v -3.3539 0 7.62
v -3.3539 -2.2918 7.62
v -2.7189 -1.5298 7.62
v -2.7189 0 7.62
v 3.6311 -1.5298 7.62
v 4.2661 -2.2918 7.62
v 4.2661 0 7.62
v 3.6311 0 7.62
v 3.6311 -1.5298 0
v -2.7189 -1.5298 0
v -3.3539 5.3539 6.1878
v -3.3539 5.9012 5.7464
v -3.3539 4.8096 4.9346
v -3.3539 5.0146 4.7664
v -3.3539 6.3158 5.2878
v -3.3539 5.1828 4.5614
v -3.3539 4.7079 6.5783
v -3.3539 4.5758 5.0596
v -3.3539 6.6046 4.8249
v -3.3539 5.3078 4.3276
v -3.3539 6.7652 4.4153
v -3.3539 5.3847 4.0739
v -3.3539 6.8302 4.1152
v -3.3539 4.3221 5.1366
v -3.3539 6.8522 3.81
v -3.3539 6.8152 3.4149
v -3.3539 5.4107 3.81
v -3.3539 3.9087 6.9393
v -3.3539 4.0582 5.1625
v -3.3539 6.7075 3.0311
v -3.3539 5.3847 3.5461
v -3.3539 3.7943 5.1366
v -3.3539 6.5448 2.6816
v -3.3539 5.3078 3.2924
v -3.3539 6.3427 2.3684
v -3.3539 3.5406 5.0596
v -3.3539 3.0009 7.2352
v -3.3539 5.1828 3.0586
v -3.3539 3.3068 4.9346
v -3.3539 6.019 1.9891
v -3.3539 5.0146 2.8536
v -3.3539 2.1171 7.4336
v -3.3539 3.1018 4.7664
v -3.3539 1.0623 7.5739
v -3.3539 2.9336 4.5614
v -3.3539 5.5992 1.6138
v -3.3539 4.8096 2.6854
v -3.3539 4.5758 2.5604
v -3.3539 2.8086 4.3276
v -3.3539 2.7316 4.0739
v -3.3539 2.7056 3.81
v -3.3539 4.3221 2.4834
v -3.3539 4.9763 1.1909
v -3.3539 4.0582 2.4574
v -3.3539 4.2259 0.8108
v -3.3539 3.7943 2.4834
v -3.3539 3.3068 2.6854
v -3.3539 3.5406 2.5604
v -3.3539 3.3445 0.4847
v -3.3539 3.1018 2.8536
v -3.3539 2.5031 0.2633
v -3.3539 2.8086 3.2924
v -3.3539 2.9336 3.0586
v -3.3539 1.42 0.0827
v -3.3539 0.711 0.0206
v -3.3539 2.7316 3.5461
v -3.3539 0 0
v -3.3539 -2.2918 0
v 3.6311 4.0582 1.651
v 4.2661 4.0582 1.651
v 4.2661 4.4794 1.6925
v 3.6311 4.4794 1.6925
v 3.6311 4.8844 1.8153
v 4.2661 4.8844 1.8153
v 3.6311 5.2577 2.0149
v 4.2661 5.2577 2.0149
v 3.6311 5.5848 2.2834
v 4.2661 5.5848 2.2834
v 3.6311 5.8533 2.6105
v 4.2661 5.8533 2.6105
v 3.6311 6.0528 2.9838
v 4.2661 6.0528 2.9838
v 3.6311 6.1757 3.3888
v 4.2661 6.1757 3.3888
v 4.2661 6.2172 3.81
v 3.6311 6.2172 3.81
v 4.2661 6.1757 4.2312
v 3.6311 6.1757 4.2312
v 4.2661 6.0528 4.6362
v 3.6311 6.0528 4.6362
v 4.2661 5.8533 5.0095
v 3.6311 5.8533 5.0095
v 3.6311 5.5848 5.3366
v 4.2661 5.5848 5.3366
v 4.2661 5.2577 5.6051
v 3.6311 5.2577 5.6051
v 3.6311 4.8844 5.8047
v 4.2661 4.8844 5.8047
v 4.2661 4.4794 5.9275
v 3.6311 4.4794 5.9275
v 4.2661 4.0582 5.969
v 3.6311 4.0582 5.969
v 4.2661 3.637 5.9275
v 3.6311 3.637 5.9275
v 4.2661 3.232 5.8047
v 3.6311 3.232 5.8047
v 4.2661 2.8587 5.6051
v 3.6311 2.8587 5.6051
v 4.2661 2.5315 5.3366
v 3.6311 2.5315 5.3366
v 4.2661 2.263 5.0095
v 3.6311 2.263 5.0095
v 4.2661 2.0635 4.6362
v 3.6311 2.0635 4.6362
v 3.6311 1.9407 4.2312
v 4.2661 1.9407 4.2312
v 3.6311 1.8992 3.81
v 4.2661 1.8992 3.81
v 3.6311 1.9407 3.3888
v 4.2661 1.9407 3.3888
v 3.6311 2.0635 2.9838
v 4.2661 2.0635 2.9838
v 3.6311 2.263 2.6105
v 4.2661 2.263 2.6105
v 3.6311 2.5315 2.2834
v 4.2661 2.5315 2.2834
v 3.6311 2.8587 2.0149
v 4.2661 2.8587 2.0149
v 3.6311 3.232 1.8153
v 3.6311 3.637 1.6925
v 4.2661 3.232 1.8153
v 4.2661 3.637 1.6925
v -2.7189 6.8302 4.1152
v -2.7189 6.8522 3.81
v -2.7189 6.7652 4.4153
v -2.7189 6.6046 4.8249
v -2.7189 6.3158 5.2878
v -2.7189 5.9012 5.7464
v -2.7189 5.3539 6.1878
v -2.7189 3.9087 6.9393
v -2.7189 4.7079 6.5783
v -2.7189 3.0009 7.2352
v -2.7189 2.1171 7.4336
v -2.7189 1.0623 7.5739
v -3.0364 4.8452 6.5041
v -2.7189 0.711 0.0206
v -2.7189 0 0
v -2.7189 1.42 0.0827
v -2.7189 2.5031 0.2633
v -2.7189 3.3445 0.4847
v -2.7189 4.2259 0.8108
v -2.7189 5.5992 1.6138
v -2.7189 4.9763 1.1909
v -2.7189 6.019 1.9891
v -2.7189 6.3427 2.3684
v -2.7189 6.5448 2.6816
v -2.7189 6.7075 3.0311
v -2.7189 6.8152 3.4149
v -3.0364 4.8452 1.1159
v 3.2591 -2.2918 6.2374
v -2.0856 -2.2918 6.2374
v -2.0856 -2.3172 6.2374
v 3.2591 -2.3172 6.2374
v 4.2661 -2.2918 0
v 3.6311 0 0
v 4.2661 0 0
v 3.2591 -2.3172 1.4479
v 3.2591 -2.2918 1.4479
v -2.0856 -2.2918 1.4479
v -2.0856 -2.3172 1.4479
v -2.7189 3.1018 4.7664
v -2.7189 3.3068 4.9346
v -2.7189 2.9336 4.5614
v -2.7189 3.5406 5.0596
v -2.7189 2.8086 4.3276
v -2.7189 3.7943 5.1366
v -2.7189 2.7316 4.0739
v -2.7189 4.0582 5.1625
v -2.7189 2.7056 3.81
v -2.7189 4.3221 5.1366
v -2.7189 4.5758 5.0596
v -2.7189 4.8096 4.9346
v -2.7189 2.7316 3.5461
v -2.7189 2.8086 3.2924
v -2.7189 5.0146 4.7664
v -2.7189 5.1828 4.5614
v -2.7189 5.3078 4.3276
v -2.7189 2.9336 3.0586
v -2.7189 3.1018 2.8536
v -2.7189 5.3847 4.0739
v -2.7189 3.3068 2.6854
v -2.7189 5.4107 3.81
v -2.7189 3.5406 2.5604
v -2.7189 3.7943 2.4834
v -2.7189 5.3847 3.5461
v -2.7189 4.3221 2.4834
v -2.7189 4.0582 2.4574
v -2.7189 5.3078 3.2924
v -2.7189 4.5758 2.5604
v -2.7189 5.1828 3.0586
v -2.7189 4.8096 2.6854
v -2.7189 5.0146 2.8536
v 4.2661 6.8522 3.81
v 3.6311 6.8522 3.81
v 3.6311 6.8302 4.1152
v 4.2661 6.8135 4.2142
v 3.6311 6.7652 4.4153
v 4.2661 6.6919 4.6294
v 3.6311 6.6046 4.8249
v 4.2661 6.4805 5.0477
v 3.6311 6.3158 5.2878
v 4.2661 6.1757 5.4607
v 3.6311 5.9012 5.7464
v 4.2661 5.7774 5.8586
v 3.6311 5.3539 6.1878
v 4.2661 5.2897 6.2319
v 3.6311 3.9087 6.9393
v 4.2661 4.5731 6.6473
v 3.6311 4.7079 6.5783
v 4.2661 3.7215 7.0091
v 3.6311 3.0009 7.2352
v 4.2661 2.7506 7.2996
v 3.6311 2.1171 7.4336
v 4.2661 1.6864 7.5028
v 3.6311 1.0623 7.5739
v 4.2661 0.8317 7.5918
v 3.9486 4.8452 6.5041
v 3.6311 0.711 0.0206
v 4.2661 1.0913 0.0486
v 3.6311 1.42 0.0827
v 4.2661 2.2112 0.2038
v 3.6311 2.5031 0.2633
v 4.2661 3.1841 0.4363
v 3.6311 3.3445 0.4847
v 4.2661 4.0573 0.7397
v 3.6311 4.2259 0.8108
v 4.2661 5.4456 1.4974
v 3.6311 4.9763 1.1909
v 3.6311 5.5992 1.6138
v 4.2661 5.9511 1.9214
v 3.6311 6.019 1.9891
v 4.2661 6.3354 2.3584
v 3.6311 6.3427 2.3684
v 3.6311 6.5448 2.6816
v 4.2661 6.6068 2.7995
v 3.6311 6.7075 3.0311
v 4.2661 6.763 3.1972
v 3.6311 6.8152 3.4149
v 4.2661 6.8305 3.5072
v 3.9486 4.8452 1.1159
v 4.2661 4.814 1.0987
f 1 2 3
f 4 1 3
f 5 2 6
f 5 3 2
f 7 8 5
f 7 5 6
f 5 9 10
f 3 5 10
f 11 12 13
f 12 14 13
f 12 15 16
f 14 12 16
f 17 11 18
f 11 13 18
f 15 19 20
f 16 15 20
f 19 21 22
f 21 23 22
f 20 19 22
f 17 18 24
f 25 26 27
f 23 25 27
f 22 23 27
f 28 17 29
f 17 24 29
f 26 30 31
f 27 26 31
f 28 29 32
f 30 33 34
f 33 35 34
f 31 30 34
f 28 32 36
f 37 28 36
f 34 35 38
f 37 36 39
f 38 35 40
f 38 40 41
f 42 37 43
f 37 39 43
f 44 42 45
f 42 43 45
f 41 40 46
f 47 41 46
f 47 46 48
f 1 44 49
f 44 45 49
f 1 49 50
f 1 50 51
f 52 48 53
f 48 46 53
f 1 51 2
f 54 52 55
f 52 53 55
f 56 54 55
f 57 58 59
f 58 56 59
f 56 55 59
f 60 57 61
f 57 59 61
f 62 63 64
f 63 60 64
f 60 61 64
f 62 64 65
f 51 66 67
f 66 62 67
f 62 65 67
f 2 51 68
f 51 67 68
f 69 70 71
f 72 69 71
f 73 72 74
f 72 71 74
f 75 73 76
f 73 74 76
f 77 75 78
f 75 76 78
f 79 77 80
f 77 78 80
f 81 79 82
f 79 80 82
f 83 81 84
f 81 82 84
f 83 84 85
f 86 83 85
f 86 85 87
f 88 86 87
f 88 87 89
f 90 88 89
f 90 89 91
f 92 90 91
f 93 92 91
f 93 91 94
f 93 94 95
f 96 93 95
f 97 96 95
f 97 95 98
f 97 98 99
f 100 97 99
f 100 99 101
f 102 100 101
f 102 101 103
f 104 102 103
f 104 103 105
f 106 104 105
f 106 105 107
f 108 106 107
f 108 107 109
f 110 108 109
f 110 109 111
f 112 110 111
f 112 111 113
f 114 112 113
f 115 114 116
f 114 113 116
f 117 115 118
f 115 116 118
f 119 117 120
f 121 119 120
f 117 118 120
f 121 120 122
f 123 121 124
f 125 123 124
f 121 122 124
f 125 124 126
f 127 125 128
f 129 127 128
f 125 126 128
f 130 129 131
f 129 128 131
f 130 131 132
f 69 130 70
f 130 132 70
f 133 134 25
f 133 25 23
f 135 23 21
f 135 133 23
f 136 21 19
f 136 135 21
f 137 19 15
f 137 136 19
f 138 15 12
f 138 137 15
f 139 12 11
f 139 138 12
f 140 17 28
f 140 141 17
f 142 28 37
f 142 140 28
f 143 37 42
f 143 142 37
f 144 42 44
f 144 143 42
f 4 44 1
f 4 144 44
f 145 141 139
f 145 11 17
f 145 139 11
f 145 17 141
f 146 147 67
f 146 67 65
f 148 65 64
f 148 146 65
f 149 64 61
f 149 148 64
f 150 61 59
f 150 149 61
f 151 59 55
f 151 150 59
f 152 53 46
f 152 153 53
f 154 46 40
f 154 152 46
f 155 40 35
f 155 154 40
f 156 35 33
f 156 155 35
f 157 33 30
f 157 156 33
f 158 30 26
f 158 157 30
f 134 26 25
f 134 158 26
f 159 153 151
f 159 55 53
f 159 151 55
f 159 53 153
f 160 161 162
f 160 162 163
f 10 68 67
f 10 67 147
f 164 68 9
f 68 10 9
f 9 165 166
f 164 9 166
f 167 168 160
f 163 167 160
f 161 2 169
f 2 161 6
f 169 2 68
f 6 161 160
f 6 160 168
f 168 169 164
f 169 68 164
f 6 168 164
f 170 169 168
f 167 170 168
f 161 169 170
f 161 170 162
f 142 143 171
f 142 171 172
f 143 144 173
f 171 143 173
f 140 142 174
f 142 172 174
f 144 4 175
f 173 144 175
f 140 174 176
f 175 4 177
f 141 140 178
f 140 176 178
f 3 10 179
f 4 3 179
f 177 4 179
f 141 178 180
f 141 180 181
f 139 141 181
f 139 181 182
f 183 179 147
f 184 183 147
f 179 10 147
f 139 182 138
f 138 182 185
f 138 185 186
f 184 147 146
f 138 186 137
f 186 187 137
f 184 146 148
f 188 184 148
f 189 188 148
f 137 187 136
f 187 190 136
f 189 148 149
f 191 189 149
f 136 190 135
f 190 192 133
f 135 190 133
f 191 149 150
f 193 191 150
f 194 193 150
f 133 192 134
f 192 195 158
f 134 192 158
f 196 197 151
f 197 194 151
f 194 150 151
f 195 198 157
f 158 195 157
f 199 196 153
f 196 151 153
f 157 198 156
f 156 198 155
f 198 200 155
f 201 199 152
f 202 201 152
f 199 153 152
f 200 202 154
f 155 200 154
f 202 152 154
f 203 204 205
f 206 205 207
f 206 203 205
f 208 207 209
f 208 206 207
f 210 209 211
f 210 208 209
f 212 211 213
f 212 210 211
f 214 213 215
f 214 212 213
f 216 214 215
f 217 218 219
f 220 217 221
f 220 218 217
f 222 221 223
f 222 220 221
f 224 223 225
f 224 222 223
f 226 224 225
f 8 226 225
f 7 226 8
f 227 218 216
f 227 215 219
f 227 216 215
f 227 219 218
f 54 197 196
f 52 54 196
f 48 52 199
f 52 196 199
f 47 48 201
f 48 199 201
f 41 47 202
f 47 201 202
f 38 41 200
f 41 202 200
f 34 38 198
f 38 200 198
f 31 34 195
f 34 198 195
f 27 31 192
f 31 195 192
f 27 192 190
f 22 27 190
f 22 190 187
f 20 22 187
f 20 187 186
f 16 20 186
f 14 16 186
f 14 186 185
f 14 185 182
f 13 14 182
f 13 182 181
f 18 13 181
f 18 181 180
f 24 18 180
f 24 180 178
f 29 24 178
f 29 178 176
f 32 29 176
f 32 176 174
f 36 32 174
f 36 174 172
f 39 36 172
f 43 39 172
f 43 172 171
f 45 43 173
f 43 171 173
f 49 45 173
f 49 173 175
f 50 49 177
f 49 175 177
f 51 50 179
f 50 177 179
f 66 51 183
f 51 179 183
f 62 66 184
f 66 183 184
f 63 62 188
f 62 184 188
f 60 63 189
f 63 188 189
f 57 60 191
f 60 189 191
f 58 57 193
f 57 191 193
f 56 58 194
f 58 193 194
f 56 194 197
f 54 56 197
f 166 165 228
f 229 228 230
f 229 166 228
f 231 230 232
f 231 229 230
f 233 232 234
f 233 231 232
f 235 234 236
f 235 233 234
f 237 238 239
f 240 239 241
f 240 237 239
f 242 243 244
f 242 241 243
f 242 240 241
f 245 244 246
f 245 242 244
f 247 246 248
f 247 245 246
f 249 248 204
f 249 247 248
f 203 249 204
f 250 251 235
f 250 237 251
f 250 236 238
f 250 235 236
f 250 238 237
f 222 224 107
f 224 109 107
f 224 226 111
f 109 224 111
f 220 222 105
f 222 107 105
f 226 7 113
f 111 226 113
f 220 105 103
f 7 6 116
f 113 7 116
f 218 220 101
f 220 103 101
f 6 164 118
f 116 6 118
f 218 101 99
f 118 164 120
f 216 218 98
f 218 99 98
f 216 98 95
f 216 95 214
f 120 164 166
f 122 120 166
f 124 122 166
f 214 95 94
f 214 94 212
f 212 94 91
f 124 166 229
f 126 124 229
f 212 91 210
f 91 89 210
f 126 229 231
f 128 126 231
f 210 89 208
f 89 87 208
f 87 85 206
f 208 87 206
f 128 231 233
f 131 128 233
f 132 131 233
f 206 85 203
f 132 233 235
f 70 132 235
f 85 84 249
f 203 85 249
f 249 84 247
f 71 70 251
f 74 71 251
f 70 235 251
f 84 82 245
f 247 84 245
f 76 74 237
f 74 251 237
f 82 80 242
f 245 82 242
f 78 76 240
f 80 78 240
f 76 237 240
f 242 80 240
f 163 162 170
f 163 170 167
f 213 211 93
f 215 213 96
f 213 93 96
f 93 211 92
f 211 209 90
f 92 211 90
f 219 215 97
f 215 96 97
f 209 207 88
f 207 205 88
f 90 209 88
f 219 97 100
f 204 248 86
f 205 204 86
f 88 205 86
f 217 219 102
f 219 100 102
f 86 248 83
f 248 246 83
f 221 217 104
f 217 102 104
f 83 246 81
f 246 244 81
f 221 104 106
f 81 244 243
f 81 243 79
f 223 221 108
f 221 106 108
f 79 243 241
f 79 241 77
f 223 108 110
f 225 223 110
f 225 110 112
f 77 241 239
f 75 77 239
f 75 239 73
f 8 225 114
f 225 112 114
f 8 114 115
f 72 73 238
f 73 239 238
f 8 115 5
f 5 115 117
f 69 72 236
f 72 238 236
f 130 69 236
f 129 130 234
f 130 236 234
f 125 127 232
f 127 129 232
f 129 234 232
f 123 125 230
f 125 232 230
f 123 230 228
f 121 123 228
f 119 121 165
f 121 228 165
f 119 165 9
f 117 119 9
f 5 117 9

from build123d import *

# Parameters (mm, degrees)
BOSS_EXTRUDE1_DEPTH       = 7.62
F_6_32_TAPPED_HOLE1_D     = 2.7051
F_6_32_TAPPED_HOLE1_DEPTH = 0.635
CUT_EXTRUDE1_REACH        = 9.62
SKETCH6_R                 = 2.159
CUT_EXTRUDE6_DEPTH        = 8.62
SKETCH27_W                = 5.344661664
SKETCH27_H                = 4.789513508
BOSS_EXTRUDE2_DEPTH       = 0.0254


with BuildPart() as part:
    # Sketch1 → Boss-Extrude1 (new body)
    with BuildSketch(Plane.XY):
        Polygon((-3.353873239, 6.85218662), (-3.353873239, -2.29181338), (4.266126761, -2.29181338), (4.266126761, 6.85218662), (3.631126761, 6.85218662), (3.631126761, -1.52981338), (-2.718873239, -1.52981338), (-2.718873239, 6.85218662), align=None)
    extrude(amount=BOSS_EXTRUDE1_DEPTH)

    # #6-32 Tapped Hole1
    with Locations(Plane.ZY.offset(3.353873239)):
        with Locations((3.81, 4.05818662)):
            Hole(F_6_32_TAPPED_HOLE1_D / 2, depth=F_6_32_TAPPED_HOLE1_DEPTH)

    # Sketch6 → Cut-Extrude1 (cut, up to next)
    with BuildSketch(Plane(origin=(4.266126761, 0, 0), x_dir=(0, 0, -1), z_dir=(1, 0, 0)), mode=Mode.PRIVATE) as cut_extrude1_sk1:
        with Locations((-3.81, 4.05818662)):
            Circle(SKETCH6_R)
    cut_extrude1_tool1 = extrude(cut_extrude1_sk1.sketch, amount=-CUT_EXTRUDE1_REACH, mode=Mode.PRIVATE) & part.part
    add(cut_extrude1_tool1.solids().sort_by_distance((4.266127, 4.058187, 3.81))[0], mode=Mode.SUBTRACT)

    # Sketch26 → Cut-Extrude6 (cut, through all)
    with BuildSketch(Plane(origin=(4.266126761, 0, 0), x_dir=(0, 0, -1), z_dir=(1, 0, 0))):
        with BuildLine():
            add(Edge.make_bspline(
                [(0, 0), (0, 6.85218662), (-3.81, 6.85218662)],
                knots=[4.71238898, 4.71238898, 4.71238898, 6.283185307, 6.283185307, 6.283185307], degree=2, weights=[1, 0.707106781, 1]))
            Line((0, 0), (0, 6.85218662))
            Line((0, 6.85218662), (-3.81, 6.85218662))
        make_face()
        with BuildLine():
            add(Edge.make_bspline(
                [(-3.81, 6.85218662), (-7.62, 6.85218662), (-7.62, 0)],
                knots=[6.283185307, 6.283185307, 6.283185307, 7.853981634, 7.853981634, 7.853981634], degree=2, weights=[1, 0.707106781, 1]))
            Line((-3.81, 6.85218662), (-7.62, 6.85218662))
            Line((-7.62, 6.85218662), (-7.62, 0))
        make_face()
    extrude(amount=-CUT_EXTRUDE6_DEPTH, mode=Mode.SUBTRACT)

    # Sketch27 → Boss-Extrude2 (add)
    with BuildSketch(Plane.XZ.offset(2.29181338)):
        with Locations((0.586749856, 3.842655774)):
            Rectangle(SKETCH27_W, SKETCH27_H)
    extrude(amount=BOSS_EXTRUDE2_DEPTH)


solid = part.part
